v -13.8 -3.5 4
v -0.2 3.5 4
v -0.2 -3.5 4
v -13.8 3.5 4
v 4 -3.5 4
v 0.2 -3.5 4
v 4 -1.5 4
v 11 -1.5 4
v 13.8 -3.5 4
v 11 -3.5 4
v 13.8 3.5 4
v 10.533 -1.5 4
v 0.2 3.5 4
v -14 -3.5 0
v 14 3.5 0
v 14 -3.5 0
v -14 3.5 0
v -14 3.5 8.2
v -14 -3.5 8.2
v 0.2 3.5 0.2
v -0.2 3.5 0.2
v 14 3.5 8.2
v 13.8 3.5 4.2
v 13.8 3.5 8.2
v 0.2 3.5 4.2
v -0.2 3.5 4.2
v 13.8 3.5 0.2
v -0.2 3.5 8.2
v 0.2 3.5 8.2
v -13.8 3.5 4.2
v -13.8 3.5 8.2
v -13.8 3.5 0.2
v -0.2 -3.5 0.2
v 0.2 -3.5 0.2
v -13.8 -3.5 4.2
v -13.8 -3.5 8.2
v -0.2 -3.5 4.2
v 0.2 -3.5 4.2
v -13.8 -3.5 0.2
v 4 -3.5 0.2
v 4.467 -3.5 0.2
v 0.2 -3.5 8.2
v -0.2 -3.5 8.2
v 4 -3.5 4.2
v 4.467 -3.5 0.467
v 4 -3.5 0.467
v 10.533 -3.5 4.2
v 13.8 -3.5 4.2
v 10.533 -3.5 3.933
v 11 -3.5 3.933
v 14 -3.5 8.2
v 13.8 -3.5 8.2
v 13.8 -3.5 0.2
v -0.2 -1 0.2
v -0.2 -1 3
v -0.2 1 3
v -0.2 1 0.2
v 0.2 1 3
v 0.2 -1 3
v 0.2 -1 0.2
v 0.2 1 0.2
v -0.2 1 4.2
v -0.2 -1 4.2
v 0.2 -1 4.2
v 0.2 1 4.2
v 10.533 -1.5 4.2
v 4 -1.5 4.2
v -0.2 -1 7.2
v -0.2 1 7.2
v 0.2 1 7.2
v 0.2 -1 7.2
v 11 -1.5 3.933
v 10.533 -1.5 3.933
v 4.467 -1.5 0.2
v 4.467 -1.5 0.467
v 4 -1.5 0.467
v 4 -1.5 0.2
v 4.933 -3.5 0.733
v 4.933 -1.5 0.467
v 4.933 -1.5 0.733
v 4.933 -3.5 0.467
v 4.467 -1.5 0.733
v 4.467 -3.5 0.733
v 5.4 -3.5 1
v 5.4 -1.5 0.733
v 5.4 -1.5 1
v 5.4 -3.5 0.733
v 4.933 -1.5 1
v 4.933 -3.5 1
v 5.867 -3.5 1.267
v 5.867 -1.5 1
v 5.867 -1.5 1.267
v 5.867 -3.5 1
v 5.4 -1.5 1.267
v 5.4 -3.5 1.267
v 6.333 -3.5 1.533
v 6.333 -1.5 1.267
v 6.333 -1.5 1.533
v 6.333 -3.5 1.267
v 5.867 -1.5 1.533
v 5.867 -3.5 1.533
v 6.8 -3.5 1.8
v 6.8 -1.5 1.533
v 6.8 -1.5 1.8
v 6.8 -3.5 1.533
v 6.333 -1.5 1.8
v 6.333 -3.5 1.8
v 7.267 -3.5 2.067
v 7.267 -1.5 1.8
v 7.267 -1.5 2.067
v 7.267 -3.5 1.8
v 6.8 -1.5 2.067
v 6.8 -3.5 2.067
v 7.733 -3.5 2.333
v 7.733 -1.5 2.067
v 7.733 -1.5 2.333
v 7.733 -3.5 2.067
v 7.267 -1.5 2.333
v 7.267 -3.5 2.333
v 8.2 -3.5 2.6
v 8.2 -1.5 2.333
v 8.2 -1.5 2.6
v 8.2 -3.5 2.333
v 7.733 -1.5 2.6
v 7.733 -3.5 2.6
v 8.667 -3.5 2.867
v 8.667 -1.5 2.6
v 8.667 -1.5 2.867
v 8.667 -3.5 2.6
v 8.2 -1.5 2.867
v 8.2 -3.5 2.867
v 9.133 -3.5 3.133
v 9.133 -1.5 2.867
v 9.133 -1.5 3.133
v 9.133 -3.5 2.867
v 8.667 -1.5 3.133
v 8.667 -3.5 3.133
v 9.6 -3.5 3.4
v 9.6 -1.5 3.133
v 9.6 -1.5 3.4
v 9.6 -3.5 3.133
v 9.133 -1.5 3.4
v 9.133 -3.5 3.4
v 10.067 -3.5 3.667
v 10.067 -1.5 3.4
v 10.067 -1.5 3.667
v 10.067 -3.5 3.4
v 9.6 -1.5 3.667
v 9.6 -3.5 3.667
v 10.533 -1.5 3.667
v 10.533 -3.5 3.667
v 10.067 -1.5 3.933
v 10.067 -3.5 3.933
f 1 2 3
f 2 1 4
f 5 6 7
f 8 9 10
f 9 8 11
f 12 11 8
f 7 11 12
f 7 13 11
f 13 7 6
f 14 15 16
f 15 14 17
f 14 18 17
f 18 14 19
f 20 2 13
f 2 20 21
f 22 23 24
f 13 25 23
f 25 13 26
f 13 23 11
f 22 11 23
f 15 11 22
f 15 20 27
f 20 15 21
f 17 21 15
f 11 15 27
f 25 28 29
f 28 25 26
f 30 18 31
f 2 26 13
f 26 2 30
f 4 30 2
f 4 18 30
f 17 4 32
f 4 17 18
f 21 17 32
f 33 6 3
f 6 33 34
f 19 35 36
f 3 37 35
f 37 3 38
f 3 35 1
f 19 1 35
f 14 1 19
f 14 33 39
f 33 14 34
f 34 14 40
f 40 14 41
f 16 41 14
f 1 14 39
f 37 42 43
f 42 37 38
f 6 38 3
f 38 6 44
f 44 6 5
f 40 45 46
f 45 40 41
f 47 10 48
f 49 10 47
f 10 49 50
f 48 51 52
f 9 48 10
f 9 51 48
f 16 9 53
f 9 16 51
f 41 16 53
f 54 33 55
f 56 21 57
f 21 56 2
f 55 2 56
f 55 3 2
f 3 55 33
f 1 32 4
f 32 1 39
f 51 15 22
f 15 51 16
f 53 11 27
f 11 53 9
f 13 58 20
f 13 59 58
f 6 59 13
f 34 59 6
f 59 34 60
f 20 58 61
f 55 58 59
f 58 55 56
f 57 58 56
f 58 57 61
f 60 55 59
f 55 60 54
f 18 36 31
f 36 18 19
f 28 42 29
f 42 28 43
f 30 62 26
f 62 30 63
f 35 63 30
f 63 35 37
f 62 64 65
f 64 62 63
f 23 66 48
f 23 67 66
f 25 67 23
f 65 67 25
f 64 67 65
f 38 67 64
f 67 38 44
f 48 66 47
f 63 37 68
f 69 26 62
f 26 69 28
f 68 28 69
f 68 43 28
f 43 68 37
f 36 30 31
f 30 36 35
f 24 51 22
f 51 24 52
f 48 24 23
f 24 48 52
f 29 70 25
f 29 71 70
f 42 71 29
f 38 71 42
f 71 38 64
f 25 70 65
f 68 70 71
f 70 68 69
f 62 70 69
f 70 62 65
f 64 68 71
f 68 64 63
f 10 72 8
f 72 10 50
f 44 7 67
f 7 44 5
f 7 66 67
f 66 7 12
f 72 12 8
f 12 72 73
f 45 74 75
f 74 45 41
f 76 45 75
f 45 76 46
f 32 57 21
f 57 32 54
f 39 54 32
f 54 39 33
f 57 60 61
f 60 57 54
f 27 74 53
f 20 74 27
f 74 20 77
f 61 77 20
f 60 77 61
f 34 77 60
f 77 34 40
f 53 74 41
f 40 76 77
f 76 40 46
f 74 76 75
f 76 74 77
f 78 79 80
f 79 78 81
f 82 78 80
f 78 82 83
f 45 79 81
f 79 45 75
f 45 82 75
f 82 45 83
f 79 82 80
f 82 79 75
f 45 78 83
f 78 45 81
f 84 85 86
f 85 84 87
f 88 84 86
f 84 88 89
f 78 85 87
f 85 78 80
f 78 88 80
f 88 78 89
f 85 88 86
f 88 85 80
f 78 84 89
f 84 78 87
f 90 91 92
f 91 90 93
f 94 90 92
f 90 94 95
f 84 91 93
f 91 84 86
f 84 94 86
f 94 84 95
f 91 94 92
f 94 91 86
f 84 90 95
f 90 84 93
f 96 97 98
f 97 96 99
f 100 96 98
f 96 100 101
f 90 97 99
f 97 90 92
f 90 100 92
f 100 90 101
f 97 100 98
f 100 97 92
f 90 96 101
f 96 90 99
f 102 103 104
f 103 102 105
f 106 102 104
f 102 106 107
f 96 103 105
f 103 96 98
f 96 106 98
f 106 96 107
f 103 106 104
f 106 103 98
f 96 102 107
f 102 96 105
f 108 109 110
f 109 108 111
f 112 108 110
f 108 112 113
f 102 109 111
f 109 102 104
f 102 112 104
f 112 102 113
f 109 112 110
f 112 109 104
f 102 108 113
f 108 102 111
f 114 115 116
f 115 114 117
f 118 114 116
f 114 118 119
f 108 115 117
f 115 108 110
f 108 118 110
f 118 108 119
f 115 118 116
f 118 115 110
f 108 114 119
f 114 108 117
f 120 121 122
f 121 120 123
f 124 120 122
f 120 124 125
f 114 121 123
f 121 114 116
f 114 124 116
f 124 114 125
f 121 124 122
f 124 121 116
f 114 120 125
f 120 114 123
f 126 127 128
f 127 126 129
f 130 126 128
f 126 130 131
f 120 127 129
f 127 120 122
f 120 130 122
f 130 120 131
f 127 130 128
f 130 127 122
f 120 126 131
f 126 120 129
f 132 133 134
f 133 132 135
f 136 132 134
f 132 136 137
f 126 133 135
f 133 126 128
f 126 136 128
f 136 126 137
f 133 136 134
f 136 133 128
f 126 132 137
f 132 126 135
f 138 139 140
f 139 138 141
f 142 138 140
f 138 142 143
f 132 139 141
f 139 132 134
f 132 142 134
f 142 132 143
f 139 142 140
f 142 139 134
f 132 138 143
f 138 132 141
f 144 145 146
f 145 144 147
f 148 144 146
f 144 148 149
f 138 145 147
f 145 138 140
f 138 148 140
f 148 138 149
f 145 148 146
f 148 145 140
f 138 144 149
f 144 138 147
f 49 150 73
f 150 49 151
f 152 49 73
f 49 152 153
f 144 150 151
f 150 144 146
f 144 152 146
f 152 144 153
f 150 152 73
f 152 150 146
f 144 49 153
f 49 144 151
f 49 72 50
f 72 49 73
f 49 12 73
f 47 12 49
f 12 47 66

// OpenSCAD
// Parameters
floor_height = 40;
room_w = 140;
room_d =70;
wall_thick = 2;
slab_thickness = 2;
stair_width = 20;
stair_height = floor_height;
stair_length = 70;
steps = 15;

door_w = 20;
door_h = 30;

stair_offset = -30;

// Create a single room (open front/back walls)
module room_open() {
    difference() {
        cube([room_w, room_d, floor_height], center=false);
        // Remove front and back walls
        translate([wall_thick, 0, 0])
            cube([room_w - 2 * wall_thick, room_d, floor_height]);
    }
}

// Create two rooms side by side with a doorway in the middle wall
module room_pair_with_doorway() {
    difference() {
        union() {
            room_open();
            translate([room_w, 0, 0]) room_open();
        }

        // Cut doorway in shared wall
        translate([
            room_w - wall_thick / 2 - door_w / 2,
            room_d / 2 - door_w / 2,
            0
        ])
        cube([door_w, door_w, door_h]);
    }
}

// Floor slab, optionally cut for stairs
module slab(z_offset, cut_for_stairs=false) {
    difference() {
        cube([2 * room_w, room_d, slab_thickness]);

        if (cut_for_stairs) {
            translate([
                2 * room_w - stair_length + stair_offset,  // leave some landing space
                0,
                -1  // ensure full cut
            ])
            cube([stair_length, stair_width, slab_thickness + 2]);
        }
    }
}

// Staircase
module staircase(x, y, z) {
    for (i = [0:steps - 1]) {
        translate([x + i * stair_length / steps, y, z + i * stair_height / steps])
            cube([stair_length / steps, stair_width, stair_height / steps]);
    }
}

// Complete building
module building() {
    // Ground floor rooms
    room_pair_with_doorway();
    slab(0);  // ground slab

    // First floor rooms
    translate([0, 0, floor_height + slab_thickness])
        room_pair_with_doorway();

    // First floor slab with stair cutout
    translate([0, 0, floor_height])
        slab(0, cut_for_stairs=true);

    // Stairs from ground to first floor
    translate([stair_offset,0,0])
    staircase(2 * room_w - stair_length, 0, slab_thickness);
}

// Render the building
scale([0.1, 0.1, 0.1])
translate([-room_w, -room_d/2])
building();
